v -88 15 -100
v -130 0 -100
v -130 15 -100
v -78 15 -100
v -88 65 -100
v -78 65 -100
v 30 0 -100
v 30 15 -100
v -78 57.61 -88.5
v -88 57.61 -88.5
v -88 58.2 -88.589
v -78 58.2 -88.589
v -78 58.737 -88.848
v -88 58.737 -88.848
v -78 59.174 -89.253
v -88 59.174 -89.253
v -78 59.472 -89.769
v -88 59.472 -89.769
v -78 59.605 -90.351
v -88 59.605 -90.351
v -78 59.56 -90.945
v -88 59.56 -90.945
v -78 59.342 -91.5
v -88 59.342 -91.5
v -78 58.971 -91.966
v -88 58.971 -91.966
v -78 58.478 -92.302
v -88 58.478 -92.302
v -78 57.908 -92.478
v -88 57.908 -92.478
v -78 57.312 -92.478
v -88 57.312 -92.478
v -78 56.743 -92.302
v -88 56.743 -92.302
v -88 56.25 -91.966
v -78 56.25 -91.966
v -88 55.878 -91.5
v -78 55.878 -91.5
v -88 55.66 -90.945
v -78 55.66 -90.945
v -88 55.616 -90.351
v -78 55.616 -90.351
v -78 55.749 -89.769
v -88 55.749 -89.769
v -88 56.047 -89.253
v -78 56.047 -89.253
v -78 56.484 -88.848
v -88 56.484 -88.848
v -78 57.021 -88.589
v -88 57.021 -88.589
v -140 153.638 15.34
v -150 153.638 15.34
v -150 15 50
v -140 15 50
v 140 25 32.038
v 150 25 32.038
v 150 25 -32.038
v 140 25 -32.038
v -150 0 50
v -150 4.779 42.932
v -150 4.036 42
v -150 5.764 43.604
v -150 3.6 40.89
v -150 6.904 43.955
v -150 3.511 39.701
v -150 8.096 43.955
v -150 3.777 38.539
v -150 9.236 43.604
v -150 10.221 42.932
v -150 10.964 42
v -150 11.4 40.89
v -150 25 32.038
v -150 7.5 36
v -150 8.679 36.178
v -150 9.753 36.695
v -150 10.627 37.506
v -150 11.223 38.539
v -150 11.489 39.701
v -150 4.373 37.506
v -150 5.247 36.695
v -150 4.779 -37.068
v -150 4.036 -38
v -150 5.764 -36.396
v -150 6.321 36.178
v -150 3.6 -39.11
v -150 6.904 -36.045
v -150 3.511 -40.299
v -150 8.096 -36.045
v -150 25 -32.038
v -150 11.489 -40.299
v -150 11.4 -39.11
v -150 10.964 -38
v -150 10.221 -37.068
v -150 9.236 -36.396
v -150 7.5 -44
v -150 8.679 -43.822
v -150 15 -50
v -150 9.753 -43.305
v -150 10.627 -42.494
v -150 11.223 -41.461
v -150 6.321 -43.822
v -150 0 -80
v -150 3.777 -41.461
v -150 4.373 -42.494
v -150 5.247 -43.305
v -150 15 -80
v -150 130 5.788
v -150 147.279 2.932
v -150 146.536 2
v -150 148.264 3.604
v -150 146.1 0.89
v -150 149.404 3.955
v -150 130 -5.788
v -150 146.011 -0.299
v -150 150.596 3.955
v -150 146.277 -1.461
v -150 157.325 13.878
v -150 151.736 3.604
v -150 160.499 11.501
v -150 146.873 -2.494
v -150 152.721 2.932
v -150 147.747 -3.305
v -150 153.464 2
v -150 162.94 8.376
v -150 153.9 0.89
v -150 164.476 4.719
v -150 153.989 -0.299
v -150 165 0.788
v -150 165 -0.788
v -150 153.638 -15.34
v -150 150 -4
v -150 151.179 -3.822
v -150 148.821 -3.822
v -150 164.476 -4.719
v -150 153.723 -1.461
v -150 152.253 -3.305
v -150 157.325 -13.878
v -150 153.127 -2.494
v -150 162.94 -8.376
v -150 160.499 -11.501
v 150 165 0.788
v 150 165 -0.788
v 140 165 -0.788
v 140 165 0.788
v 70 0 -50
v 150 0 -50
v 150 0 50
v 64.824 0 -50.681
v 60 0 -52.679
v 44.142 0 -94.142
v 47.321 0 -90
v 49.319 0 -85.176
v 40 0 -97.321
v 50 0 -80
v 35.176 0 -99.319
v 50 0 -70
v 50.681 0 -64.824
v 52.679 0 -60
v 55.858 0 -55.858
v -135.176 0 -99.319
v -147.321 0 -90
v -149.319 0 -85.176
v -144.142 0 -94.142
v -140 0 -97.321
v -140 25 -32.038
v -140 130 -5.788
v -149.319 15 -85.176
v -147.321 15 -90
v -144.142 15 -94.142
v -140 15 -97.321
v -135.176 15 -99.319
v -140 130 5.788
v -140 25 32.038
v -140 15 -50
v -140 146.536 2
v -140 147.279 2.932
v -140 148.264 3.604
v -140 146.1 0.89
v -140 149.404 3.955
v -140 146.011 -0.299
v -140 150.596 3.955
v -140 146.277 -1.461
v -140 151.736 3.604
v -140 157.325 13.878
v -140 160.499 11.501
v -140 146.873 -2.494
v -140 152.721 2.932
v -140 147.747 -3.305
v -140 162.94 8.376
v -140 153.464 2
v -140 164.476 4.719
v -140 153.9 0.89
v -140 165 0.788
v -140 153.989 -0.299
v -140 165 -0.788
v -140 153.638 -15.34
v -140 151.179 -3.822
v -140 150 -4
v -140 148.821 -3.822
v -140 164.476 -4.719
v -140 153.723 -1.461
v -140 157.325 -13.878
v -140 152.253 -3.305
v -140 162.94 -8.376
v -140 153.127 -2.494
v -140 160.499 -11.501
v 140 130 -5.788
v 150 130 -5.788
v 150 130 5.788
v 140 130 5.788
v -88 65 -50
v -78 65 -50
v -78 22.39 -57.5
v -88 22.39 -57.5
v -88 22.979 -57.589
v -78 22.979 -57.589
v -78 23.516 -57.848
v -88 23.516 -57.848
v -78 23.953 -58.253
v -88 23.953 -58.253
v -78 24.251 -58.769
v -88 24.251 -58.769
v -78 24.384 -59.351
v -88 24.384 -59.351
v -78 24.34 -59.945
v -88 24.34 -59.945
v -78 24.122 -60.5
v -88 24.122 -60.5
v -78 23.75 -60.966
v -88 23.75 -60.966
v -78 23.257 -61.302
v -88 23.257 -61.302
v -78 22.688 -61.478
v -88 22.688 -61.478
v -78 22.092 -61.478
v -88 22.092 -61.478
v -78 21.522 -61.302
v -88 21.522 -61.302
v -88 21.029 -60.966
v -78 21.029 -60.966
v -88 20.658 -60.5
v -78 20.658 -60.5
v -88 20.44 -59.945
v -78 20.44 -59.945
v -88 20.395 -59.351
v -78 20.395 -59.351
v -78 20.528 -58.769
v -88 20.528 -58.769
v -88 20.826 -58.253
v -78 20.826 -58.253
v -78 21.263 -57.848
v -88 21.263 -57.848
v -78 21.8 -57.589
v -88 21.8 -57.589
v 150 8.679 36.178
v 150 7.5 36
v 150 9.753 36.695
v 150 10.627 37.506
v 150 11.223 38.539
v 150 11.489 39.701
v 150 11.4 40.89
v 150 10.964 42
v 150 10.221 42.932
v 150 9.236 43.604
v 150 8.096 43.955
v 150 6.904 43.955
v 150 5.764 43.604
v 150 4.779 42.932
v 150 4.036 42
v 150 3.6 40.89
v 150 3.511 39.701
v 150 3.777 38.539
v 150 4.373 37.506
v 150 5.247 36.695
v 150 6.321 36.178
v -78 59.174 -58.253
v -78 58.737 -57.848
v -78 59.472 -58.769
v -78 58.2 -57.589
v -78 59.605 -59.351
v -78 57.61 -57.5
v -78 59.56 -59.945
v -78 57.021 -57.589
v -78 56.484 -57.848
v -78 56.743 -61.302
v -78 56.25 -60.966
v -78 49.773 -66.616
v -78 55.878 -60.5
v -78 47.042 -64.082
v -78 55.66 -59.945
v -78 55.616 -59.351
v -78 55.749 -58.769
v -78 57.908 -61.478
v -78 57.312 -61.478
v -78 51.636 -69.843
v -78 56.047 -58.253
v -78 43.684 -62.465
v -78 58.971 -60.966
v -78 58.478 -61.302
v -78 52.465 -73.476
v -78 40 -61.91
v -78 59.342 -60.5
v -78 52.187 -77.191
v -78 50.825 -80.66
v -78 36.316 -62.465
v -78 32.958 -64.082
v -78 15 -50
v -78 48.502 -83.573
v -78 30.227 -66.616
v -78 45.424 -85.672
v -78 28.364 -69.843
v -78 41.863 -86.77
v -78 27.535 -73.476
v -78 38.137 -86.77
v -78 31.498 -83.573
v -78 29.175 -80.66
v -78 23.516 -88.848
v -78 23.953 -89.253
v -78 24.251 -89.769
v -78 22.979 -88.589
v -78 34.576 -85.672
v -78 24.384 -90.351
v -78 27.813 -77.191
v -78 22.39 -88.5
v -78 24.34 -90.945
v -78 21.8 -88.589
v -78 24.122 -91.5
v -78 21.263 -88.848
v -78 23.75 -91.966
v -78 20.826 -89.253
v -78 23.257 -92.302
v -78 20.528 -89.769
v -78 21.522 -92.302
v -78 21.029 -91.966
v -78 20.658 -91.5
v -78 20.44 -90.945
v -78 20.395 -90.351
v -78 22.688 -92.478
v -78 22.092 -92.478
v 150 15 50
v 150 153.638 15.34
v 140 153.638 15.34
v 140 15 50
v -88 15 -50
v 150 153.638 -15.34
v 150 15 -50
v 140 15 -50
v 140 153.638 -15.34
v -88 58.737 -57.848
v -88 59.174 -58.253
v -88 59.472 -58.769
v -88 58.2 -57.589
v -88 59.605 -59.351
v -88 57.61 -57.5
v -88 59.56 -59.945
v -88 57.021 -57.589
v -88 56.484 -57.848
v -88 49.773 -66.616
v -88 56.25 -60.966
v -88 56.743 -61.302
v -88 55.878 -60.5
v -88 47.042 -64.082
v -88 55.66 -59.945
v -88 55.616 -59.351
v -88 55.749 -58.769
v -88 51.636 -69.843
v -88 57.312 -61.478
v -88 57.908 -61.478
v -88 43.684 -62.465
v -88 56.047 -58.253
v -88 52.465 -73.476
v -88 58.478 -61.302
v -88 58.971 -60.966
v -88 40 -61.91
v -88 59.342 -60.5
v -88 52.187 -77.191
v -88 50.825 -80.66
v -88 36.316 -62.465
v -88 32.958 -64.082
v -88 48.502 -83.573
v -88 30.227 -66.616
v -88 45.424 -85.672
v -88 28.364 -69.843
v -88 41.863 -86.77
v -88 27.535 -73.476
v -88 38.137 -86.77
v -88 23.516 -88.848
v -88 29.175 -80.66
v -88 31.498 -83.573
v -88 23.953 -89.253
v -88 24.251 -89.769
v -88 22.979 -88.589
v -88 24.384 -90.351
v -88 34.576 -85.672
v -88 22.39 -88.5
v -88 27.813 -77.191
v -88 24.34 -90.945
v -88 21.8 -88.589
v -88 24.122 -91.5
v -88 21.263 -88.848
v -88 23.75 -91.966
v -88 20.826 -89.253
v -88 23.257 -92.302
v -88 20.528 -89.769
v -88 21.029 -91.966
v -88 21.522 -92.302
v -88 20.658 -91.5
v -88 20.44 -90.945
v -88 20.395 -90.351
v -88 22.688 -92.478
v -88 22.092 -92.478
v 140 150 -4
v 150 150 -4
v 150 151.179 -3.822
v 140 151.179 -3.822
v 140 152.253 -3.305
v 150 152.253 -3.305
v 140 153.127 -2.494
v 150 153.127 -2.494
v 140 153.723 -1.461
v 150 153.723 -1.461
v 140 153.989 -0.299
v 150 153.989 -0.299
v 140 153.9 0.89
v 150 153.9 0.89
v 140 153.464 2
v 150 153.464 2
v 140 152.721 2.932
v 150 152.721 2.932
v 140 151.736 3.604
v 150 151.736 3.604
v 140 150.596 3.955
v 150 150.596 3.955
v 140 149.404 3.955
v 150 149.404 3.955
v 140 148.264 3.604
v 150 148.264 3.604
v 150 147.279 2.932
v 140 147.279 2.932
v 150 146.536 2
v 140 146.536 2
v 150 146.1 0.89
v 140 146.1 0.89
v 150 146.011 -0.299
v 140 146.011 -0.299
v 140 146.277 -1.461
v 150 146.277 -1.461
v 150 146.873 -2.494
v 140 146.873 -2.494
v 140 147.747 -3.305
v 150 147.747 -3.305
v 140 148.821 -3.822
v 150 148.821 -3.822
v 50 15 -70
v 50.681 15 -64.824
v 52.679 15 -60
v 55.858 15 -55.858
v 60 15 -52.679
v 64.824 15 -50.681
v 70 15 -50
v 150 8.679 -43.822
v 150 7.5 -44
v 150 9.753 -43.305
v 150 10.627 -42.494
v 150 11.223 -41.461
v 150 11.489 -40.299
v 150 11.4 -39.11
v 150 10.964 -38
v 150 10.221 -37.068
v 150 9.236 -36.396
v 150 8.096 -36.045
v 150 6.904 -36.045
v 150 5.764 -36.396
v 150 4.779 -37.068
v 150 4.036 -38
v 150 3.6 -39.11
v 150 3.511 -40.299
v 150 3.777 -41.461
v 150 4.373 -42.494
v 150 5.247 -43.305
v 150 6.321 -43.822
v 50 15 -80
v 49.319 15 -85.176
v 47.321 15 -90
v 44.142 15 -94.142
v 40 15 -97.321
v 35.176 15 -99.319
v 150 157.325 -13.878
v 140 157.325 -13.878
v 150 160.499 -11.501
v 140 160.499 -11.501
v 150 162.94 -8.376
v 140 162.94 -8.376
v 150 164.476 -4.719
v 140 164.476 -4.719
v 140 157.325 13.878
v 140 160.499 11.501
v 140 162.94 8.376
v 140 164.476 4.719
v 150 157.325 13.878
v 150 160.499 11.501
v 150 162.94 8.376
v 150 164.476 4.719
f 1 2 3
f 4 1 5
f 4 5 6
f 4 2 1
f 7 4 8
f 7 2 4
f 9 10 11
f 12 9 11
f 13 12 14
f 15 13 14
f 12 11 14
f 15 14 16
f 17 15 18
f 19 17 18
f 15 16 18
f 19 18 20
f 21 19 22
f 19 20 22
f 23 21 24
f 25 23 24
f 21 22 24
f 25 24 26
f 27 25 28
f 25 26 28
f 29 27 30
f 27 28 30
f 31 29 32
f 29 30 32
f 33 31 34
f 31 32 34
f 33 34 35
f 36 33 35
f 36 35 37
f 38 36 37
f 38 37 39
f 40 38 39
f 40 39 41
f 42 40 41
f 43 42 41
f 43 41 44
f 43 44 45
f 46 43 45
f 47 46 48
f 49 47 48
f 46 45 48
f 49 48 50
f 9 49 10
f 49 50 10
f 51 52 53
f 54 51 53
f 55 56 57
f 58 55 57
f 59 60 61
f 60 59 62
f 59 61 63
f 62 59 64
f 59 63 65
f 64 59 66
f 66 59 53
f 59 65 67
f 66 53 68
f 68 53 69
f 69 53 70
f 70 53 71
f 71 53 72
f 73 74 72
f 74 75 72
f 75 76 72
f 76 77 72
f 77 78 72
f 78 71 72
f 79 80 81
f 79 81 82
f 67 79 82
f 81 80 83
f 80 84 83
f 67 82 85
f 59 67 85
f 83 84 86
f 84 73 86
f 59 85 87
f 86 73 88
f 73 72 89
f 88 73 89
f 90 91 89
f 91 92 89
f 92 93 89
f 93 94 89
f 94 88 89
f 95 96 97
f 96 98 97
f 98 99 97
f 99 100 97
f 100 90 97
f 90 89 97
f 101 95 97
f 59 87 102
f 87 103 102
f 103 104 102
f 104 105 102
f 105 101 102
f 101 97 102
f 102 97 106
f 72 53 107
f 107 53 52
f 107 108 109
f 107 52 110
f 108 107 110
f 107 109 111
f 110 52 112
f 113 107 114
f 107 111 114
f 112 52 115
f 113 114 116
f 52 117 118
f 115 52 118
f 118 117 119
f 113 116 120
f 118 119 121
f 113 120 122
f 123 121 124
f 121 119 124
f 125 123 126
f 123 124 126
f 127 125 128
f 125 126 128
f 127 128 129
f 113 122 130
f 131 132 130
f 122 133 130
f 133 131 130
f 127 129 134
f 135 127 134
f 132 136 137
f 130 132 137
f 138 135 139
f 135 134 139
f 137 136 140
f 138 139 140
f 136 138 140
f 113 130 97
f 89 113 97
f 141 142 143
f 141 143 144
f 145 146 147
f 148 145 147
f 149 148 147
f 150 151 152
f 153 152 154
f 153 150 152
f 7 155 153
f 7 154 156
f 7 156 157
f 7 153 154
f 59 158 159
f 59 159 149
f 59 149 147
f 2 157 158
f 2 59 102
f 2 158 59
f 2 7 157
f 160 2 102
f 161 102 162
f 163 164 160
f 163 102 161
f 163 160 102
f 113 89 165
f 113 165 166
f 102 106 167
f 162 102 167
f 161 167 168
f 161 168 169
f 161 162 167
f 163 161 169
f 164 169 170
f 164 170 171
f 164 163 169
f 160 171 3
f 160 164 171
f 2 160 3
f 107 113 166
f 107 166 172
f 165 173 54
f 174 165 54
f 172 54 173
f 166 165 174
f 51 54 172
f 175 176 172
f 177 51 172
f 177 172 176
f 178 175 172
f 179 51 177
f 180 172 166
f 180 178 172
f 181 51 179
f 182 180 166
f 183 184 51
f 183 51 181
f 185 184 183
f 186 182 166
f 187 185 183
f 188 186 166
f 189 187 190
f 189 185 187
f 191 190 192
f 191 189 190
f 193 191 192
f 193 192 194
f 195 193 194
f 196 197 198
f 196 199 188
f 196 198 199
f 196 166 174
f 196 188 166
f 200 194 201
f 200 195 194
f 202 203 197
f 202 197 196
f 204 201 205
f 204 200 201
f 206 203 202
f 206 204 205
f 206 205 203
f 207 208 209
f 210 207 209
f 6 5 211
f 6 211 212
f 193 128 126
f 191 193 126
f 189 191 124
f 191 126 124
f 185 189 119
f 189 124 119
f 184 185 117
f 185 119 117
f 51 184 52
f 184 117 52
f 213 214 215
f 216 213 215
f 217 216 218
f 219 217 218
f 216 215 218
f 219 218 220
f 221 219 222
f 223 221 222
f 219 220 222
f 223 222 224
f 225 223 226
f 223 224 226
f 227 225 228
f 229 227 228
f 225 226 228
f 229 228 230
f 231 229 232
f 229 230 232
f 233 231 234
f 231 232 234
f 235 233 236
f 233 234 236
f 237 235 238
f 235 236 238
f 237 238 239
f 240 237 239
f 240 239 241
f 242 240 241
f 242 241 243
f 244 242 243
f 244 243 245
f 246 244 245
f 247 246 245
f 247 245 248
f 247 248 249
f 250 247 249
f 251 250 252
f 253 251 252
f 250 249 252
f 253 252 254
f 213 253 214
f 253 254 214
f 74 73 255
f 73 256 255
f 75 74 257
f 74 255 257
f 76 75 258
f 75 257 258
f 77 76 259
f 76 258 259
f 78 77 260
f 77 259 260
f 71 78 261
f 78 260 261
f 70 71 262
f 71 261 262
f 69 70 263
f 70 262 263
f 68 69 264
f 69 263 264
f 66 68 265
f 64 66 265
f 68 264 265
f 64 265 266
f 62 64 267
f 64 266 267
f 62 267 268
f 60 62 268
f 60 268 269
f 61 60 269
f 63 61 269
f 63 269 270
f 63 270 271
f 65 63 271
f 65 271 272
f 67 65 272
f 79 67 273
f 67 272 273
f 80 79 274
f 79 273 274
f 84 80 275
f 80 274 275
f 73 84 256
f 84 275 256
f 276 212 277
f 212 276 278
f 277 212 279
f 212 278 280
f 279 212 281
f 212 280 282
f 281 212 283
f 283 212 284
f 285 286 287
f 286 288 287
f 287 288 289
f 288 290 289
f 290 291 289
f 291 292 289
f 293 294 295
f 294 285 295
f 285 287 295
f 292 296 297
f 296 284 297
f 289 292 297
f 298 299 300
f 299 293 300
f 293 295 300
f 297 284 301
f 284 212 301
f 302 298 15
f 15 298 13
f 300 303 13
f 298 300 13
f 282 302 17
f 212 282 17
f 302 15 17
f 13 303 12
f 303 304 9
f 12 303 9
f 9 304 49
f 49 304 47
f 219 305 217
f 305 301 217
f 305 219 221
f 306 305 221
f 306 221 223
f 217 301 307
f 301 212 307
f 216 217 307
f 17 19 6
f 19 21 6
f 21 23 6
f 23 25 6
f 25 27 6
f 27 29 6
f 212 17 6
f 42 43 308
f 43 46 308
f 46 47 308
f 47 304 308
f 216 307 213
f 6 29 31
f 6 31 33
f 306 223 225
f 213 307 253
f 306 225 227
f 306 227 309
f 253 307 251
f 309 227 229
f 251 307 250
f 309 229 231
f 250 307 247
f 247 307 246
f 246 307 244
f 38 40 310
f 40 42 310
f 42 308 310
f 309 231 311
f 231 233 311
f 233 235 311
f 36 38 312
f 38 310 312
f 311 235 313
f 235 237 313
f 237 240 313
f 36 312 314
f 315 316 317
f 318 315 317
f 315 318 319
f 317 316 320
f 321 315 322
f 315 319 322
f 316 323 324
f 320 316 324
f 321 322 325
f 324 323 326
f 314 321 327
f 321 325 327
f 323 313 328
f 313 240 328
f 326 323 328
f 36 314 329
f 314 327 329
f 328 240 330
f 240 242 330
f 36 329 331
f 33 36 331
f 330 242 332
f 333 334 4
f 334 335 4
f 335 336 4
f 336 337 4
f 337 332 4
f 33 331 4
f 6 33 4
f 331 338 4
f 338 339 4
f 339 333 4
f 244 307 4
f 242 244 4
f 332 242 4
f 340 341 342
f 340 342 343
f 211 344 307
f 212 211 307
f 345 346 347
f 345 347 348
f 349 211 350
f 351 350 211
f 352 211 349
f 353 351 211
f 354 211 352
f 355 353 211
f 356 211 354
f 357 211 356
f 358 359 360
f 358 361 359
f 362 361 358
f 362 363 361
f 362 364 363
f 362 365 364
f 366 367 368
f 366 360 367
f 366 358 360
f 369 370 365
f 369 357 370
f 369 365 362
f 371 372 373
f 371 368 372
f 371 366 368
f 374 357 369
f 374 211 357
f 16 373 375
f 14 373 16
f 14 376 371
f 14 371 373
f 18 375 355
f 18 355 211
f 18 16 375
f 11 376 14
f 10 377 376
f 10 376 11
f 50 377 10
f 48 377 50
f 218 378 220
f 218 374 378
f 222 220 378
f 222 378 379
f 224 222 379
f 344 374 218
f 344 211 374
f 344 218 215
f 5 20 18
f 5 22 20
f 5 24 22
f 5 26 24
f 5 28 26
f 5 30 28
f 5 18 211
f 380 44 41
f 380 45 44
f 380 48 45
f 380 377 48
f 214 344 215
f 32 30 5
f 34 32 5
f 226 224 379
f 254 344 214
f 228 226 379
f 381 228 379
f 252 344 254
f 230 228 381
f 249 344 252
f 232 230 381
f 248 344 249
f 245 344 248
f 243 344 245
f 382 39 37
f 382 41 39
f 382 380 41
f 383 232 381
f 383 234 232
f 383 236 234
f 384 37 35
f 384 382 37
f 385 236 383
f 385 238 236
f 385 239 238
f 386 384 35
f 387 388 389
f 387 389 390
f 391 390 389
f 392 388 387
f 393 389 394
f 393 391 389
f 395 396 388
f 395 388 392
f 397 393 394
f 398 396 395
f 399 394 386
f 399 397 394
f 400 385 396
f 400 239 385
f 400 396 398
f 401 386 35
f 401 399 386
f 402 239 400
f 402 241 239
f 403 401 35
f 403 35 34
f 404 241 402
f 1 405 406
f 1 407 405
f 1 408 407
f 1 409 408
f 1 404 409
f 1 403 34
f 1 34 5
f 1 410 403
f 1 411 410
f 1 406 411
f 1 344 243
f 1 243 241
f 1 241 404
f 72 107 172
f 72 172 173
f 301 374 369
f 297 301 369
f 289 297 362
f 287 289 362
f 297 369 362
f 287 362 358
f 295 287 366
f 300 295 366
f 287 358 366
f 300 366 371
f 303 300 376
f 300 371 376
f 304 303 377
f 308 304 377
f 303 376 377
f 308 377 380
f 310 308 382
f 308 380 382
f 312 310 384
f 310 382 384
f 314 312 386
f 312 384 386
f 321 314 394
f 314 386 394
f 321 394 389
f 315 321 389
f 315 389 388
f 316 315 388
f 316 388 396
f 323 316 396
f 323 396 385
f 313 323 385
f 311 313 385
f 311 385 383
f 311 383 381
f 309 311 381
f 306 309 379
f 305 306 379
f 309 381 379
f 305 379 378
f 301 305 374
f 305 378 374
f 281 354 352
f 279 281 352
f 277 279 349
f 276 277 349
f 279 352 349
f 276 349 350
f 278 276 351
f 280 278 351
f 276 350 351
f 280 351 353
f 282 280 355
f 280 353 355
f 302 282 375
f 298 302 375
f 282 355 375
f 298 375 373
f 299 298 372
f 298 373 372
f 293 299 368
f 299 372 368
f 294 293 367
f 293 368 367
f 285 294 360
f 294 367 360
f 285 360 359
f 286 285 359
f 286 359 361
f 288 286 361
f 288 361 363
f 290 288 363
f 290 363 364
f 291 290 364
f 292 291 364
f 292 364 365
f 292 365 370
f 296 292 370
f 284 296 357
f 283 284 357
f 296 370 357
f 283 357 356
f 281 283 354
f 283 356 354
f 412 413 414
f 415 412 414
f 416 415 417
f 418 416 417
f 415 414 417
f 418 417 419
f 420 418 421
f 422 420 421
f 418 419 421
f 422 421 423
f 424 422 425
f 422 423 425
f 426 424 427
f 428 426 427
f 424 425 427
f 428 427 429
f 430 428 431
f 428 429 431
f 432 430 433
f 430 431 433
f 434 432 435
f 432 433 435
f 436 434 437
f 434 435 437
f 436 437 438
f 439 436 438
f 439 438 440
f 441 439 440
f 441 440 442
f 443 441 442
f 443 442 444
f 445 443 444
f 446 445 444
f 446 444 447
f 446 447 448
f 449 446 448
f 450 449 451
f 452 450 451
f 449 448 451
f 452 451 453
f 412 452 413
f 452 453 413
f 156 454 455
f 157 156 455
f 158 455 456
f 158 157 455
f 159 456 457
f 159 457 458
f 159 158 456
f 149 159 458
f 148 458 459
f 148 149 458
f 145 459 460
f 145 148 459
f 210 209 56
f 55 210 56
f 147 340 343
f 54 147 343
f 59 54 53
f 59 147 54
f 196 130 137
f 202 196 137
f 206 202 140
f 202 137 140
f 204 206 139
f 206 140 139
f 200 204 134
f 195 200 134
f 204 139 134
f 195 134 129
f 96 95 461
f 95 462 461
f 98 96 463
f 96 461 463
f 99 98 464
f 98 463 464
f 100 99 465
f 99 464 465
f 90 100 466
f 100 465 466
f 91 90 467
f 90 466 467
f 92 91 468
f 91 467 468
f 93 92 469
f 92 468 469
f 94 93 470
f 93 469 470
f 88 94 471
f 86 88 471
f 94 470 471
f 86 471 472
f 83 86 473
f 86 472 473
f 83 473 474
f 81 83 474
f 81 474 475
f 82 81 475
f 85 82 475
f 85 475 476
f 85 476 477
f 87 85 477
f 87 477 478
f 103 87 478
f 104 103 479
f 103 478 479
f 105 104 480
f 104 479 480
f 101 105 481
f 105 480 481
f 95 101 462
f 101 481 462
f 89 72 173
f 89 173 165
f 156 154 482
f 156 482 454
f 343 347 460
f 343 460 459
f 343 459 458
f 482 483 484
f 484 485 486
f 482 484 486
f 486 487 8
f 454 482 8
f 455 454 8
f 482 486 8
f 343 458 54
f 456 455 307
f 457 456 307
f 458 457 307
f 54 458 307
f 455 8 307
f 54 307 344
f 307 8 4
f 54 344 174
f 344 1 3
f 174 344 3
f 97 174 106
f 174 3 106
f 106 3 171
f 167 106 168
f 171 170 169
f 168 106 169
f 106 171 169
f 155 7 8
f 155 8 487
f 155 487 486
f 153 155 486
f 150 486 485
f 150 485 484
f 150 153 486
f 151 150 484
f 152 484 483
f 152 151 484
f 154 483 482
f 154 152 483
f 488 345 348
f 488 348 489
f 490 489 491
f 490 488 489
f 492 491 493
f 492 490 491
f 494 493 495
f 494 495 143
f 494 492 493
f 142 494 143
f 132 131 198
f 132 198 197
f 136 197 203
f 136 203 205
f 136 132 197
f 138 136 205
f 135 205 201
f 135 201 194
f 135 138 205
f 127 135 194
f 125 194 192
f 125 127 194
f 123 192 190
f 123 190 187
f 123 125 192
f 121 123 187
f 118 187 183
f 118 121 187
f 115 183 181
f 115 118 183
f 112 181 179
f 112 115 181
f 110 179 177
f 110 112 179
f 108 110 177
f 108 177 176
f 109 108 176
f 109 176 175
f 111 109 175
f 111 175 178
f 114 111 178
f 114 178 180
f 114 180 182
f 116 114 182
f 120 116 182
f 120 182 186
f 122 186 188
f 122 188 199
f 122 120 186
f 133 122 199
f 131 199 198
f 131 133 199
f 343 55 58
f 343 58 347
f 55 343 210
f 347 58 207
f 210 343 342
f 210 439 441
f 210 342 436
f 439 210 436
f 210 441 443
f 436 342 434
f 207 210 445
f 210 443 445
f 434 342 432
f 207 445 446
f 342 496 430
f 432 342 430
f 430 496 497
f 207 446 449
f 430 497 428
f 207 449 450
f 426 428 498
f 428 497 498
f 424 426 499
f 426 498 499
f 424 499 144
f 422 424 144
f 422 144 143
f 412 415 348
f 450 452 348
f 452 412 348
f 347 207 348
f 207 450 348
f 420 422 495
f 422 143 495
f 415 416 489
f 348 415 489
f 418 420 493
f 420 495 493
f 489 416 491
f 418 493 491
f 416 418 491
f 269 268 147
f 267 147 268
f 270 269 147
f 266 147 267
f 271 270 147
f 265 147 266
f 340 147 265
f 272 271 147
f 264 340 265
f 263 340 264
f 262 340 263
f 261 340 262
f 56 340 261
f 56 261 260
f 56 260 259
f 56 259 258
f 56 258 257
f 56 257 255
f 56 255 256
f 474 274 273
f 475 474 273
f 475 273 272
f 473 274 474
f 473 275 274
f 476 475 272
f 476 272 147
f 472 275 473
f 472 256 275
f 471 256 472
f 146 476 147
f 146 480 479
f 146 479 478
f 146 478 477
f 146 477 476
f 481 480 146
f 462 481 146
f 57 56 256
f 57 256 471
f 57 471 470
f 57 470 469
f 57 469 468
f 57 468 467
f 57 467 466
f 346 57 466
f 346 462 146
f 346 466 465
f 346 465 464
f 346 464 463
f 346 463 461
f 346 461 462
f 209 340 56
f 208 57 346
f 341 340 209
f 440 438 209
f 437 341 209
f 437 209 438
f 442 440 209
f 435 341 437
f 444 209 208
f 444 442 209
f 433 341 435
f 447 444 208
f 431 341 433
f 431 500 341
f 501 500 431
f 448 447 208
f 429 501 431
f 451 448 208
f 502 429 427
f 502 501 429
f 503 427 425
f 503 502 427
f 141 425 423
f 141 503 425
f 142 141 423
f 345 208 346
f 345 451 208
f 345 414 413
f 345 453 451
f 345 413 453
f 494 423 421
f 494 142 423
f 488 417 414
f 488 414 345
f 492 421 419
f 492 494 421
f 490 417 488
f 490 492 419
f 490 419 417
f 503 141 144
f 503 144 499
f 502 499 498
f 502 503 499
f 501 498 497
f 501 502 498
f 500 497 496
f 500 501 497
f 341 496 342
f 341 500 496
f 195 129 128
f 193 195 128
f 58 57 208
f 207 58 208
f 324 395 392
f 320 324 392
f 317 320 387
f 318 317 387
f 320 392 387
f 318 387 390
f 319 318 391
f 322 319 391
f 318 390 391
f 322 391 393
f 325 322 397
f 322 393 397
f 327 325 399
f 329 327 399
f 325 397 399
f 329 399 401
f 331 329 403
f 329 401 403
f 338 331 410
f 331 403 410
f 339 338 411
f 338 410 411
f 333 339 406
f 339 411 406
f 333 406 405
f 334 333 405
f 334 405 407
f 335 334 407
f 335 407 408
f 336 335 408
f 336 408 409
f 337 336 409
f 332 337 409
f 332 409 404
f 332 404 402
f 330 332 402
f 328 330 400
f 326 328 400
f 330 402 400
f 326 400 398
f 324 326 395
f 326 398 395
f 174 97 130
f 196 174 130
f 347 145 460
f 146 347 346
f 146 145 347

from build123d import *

# Parameters (mm, degrees)
BOSS_EXTRUDE4_DEPTH     = 15
SKETCH9_R               = 4
CUT_EXTRUDE2_DEPTH      = 151
CUT_EXTRUDE2_DEPTH_BACK = 151
BOSS_EXTRUDE6_START     = 150
SKETCH10_R              = 4
BOSS_EXTRUDE6_DEPTH     = 10
BOSS_EXTRUDE7_START     = -150
SKETCH12_R              = 4
BOSS_EXTRUDE7_DEPTH     = 10
SKETCH14_W              = 10
SKETCH14_H              = 50
BOSS_EXTRUDE8_DEPTH     = 50
SKETCH15_R              = 2
SKETCH15_R_2            = 12.5
CUT_EXTRUDE3_DEPTH      = 10


with BuildPart() as part:
    # Sketch8 → Boss-Extrude4 (new body)
    with BuildSketch(Plane(origin=(0, 0, 0), x_dir=(1, 0, 0), z_dir=(0, 1, 0))):
        with BuildLine():
            Line((-150, 50), (-150, 80))
            ThreePointArc((-150, 80), (-144.142135624, 94.142135624), (-130, 100))
            Line((-130, 100), (30, 100))
            ThreePointArc((30, 100), (44.142135624, 94.142135624), (50, 80))
            Line((50, 80), (50, 70))
            ThreePointArc((50, 70), (55.857864376, 55.857864376), (70, 50))
            Line((70, 50), (150, 50))
            Line((150, 50), (150, -50))
            Line((150, -50), (-150, -50))
            Line((-150, -50), (-150, 50))
        make_face()
    extrude(amount=BOSS_EXTRUDE4_DEPTH)

    # Sketch9 → Cut-Extrude2 (cut, two sides)
    with BuildSketch(Plane(origin=(0, 0, 0), x_dir=(0, 0, -1), z_dir=(1, 0, 0))) as cut_extrude2_sk:
        with Locations((-40, 7.5)):
            Circle(SKETCH9_R)
        with Locations((40, 7.5)):
            Circle(SKETCH9_R)
    extrude(amount=CUT_EXTRUDE2_DEPTH, mode=Mode.SUBTRACT)
    extrude(cut_extrude2_sk.sketch, amount=-CUT_EXTRUDE2_DEPTH_BACK, mode=Mode.SUBTRACT)

    # Sketch10 → Boss-Extrude6 (add)
    with BuildSketch(Plane(origin=(0, 0, 0), x_dir=(0, 0, -1), z_dir=(1, 0, 0)).offset(BOSS_EXTRUDE6_START)):
        with BuildLine():
            Line((-50, 15), (50, 15))
            Line((50, 15), (15.340491406, 153.638034376))
            ThreePointArc((15.340491406, 153.638034376), (10.019537045, 161.82308157), (0.788353904, 165))
            Line((0.788353904, 165), (-0.788353904, 165))
            ThreePointArc((-0.788353904, 165), (-10.019537045, 161.82308157), (-15.340491406, 153.638034376))
            Line((-15.340491406, 153.638034376), (-50, 15))
        make_face()
        with Locations((0, 150)):
            Circle(SKETCH10_R, mode=Mode.SUBTRACT)
        Polygon((-32.038353904, 25), (32.038353904, 25), (5.788353904, 130), (-5.788353904, 130), align=None, mode=Mode.SUBTRACT)
    extrude(amount=-BOSS_EXTRUDE6_DEPTH)

    # Sketch12 → Boss-Extrude7 (add)
    with BuildSketch(Plane(origin=(0, 0, 0), x_dir=(0, 0, -1), z_dir=(1, 0, 0)).offset(BOSS_EXTRUDE7_START)):
        with BuildLine():
            Line((-50, 15), (50, 15))
            Line((50, 15), (15.340491406, 153.638034376))
            ThreePointArc((15.340491406, 153.638034376), (10.019537045, 161.82308157), (0.788353904, 165))
            Line((0.788353904, 165), (-0.788353904, 165))
            ThreePointArc((-0.788353904, 165), (-10.019537045, 161.82308157), (-15.340491406, 153.638034376))
            Line((-15.340491406, 153.638034376), (-50, 15))
        make_face()
        with Locations((0, 150)):
            Circle(SKETCH12_R, mode=Mode.SUBTRACT)
        Polygon((-32.038353904, 25), (32.038353904, 25), (5.788353904, 130), (-5.788353904, 130), align=None, mode=Mode.SUBTRACT)
    extrude(amount=BOSS_EXTRUDE7_DEPTH)

    # Sketch14 → Boss-Extrude8 (add)
    with BuildSketch(Plane(origin=(0, 15, 0), x_dir=(1, 0, 0), z_dir=(0, 1, 0))):
        with Locations((-83, 75)):
            Rectangle(SKETCH14_W, SKETCH14_H)
    extrude(amount=BOSS_EXTRUDE8_DEPTH)

    # Sketch15 → Cut-Extrude3 (cut)
    with BuildSketch(Plane.ZY.offset(88)):
        with Locations((-90.5, 57.610296458)):
            Circle(SKETCH15_R)
        with Locations((-59.5, 57.610296458)):
            Circle(SKETCH15_R)
        with Locations((-90.5, 22.389703542)):
            Circle(SKETCH15_R)
        with Locations((-59.5, 22.389703542)):
            Circle(SKETCH15_R)
        with Locations((-74.409733022, 40)):
            Circle(SKETCH15_R_2)
    extrude(amount=-CUT_EXTRUDE3_DEPTH, mode=Mode.SUBTRACT)


solid = part.part
